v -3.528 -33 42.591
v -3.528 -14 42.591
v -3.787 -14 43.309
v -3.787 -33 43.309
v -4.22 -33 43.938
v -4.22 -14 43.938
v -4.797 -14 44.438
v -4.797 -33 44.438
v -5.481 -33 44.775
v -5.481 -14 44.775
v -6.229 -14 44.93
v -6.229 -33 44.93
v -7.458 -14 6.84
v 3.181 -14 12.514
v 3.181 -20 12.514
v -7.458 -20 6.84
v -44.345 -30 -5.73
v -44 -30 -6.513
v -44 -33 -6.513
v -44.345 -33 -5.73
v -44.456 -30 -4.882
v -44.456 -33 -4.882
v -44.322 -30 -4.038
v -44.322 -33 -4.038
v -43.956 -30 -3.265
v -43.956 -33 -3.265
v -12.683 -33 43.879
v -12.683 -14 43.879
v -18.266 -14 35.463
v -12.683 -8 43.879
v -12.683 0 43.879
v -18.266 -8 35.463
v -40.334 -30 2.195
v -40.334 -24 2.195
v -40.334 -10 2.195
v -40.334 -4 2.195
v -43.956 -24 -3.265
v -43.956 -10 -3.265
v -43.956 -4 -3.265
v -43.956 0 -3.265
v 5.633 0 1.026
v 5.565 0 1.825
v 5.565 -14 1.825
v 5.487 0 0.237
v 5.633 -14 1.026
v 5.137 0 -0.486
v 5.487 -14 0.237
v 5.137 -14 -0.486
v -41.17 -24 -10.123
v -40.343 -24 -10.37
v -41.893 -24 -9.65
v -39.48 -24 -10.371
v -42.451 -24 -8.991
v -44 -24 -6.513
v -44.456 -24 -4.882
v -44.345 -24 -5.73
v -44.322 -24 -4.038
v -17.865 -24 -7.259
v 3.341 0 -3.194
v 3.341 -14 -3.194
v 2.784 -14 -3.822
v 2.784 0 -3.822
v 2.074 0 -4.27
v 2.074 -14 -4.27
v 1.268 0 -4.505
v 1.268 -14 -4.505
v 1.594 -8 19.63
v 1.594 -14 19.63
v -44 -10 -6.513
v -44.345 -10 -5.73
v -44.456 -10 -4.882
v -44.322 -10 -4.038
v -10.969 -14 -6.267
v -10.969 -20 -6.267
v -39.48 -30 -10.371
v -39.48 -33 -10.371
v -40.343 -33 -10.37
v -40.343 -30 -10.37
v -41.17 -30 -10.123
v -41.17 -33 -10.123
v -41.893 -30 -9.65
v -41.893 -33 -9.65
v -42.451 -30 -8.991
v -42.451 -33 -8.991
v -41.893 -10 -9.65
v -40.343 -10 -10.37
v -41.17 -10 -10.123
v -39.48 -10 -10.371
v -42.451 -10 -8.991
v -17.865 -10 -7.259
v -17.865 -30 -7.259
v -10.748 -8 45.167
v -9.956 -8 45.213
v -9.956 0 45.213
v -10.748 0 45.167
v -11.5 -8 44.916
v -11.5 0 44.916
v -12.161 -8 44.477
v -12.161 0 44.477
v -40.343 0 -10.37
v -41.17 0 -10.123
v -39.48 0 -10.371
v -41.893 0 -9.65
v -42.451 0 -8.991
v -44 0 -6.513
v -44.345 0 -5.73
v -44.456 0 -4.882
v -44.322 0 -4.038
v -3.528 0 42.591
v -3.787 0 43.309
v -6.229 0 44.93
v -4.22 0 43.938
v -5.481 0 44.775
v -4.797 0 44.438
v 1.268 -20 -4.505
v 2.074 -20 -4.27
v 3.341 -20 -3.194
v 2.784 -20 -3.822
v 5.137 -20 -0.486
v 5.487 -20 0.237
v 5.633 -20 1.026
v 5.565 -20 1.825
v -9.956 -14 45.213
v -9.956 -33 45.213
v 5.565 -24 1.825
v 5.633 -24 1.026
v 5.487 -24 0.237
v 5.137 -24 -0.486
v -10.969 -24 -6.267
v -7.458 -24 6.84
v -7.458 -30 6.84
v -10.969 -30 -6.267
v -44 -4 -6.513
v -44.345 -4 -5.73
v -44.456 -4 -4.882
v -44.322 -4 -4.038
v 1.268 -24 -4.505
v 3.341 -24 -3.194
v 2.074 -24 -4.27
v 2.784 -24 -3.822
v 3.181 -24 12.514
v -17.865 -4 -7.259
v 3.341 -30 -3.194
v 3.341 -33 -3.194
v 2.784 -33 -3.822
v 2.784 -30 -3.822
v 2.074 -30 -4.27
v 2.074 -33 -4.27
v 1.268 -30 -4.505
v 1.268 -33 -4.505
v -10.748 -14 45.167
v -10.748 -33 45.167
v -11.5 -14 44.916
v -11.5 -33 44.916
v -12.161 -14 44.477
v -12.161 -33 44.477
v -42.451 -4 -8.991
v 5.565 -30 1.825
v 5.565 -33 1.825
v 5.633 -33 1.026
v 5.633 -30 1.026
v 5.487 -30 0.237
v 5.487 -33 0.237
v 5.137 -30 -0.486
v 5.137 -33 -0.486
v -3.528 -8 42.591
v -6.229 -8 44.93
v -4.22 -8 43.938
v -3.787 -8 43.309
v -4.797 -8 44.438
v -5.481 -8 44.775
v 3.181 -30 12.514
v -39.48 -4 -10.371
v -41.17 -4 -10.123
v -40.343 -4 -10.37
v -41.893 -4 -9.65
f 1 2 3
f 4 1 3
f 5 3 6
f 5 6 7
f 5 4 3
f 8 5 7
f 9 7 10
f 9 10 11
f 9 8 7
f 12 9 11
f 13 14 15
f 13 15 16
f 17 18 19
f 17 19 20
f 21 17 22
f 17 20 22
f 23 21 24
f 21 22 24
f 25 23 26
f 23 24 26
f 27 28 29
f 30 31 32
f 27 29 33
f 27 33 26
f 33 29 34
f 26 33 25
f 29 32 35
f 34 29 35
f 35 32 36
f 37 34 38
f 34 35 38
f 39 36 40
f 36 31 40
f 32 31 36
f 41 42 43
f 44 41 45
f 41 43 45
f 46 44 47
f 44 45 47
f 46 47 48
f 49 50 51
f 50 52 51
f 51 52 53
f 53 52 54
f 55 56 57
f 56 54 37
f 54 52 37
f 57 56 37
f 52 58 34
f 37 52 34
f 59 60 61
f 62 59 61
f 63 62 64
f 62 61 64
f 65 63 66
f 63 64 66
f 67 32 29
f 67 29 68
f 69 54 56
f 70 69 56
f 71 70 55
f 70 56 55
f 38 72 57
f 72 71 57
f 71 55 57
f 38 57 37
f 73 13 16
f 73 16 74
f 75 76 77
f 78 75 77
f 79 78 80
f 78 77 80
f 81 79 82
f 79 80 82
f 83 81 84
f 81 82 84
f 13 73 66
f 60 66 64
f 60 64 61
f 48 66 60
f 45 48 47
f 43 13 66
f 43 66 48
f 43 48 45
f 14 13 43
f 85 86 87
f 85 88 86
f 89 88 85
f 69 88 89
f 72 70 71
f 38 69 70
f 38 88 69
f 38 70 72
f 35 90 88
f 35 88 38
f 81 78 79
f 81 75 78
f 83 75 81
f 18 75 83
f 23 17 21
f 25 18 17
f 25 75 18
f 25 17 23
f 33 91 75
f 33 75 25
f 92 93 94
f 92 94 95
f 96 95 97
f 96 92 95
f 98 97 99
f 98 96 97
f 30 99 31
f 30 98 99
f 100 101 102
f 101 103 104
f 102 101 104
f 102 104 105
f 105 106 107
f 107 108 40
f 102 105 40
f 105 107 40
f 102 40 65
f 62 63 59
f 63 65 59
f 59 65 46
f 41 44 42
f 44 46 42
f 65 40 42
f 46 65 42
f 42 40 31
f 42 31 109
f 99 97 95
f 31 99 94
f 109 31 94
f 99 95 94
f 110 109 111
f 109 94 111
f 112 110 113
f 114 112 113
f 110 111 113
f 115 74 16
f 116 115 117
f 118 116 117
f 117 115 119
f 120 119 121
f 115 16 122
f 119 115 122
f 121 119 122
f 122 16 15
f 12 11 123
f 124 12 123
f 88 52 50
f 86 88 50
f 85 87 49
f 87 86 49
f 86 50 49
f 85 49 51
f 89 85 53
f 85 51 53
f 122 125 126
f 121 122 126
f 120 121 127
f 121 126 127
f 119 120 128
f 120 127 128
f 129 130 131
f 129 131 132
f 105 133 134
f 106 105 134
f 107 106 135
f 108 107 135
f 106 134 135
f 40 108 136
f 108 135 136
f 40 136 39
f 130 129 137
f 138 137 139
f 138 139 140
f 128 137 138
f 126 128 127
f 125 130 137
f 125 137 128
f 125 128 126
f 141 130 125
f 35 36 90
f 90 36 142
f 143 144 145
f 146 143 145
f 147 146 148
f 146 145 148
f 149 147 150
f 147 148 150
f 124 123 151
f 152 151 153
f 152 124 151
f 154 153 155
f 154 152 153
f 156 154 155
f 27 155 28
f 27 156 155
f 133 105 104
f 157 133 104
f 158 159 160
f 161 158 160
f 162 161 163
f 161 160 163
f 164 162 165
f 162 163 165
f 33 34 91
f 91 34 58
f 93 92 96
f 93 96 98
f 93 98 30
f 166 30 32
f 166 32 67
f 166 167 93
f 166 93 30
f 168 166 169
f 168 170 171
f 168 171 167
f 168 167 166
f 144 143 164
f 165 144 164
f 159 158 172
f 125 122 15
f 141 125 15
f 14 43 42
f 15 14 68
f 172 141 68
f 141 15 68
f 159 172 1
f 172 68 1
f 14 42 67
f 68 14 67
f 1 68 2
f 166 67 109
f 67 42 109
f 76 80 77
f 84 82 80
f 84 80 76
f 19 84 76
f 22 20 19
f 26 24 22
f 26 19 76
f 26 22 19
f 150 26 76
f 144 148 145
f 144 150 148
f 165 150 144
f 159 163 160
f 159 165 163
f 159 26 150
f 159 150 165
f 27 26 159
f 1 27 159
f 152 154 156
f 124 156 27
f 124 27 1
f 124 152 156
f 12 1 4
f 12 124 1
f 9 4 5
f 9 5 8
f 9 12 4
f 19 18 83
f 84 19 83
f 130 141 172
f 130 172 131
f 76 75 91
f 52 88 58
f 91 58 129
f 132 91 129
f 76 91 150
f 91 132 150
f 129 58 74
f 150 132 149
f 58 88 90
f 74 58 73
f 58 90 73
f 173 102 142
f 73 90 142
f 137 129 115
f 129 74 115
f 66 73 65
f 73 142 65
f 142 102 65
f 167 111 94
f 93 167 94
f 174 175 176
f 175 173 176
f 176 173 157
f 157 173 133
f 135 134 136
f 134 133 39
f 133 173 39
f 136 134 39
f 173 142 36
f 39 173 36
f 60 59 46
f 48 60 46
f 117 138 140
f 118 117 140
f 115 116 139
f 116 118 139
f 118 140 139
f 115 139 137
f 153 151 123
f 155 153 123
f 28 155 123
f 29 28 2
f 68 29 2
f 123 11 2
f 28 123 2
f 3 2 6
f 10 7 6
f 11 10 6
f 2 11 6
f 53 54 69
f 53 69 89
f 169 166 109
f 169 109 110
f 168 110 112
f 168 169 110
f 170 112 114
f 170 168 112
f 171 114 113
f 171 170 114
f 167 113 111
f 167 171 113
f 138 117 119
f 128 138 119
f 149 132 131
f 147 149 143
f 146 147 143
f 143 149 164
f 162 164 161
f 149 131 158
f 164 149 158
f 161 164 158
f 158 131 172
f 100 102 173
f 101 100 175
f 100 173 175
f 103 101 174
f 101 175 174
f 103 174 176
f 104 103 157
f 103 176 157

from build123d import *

# Parameters (mm, degrees)
PAD044_DEPTH = 6
PAD045_DEPTH = 6
PAD046_DEPTH = 6
PAD047_DEPTH = 6
PAD048_DEPTH = 6
PAD039_DEPTH = 33
FILLET021_R  = 3
FILLET022_R  = 3


with BuildPart() as pad044:
    # Sketch048 → Pad044 (new body)
    with BuildSketch(Plane.XZ.offset(8)):
        Polygon((-14.595035, 49.426792), (-21.11467, 37.733963), (4.396957, 17.395527), (4.396957, 50.985836), align=None)
    extrude(amount=PAD044_DEPTH)


with BuildPart() as pad045:
    # Sketch049 → Pad045 (new body)
    with BuildSketch(Plane.XZ.offset(4)):
        Polygon((-44.716217, 4.039343), (-16.086502, -8.007815), (-47.125652, -16.724289), align=None)
    extrude(amount=PAD045_DEPTH)


with BuildPart() as pad046:
    # Sketch050 → Pad046 (new body)
    with BuildSketch(Plane.XZ.offset(24)):
        Polygon((-44.716217, 4.039343), (-16.086502, -8.007815), (-47.125652, -16.724289), align=None)
    extrude(amount=PAD046_DEPTH)


with BuildPart() as pad047:
    # Sketch051 → Pad047 (new body)
    with BuildSketch(Plane.XZ.offset(14)):
        Polygon((5.367801, 13.680764), (-7.457918, 6.840382), (-11.733156, -9.120509), (13.253242, -11.590648), (11.448138, 11.685653), align=None)
    extrude(amount=PAD047_DEPTH)


with BuildPart() as pad048:
    # Sketch052 → Pad048 (new body)
    with BuildSketch(Plane.XZ.offset(24)):
        Polygon((5.367801, 13.680764), (-7.457918, 6.840382), (-11.733156, -9.120509), (13.253242, -11.590648), (11.448138, 11.685653), align=None)
    extrude(amount=PAD048_DEPTH)


with BuildPart() as cut019:
    # Sketch044 → Pad039 (new body)
    with BuildSketch(Plane(origin=(0, 0, 0), x_dir=(0.848048, 0, 0.529919), z_dir=(0, -1, 0))):
        Polygon((-40.765351, 19.72502), (-40.765351, 12.915253), (-0.082344, -5.035194), (5.261885, -2.605449), (20.317712, 40.085552), (14.098928, 44.660699), align=None)
    extrude(amount=PAD039_DEPTH)

    # Fillet021
    fillet021_edges = [cut019.edges().sort_by_distance(p)[0] for p in [
        (-4.011709, -16.5, 44.761223),
        (-11.709995, -16.5, 45.345714),
    ]]
    fillet(fillet021_edges, radius=FILLET021_R)

    # Fillet022
    fillet022_edges = [cut019.edges().sort_by_distance(p)[0] for p in [
        (5.843009, -16.5, 0.578828),
        (2.598414, -16.5, -4.313722),
        (-41.41502, -16.5, -10.649589),
        (-45.023647, -16.5, -4.874579),
    ]]
    fillet(fillet022_edges, radius=FILLET022_R)

    # Cut011: cut Pad048
    add(pad048.part, mode=Mode.SUBTRACT)

    # Cut012: cut Pad047
    add(pad047.part, mode=Mode.SUBTRACT)

    # Cut013: cut Pad046
    add(pad046.part, mode=Mode.SUBTRACT)

    # Cut014: cut Pad045
    add(pad045.part, mode=Mode.SUBTRACT)

    # Cut019: cut Pad044
    add(pad044.part, mode=Mode.SUBTRACT)


solid = cut019.part
